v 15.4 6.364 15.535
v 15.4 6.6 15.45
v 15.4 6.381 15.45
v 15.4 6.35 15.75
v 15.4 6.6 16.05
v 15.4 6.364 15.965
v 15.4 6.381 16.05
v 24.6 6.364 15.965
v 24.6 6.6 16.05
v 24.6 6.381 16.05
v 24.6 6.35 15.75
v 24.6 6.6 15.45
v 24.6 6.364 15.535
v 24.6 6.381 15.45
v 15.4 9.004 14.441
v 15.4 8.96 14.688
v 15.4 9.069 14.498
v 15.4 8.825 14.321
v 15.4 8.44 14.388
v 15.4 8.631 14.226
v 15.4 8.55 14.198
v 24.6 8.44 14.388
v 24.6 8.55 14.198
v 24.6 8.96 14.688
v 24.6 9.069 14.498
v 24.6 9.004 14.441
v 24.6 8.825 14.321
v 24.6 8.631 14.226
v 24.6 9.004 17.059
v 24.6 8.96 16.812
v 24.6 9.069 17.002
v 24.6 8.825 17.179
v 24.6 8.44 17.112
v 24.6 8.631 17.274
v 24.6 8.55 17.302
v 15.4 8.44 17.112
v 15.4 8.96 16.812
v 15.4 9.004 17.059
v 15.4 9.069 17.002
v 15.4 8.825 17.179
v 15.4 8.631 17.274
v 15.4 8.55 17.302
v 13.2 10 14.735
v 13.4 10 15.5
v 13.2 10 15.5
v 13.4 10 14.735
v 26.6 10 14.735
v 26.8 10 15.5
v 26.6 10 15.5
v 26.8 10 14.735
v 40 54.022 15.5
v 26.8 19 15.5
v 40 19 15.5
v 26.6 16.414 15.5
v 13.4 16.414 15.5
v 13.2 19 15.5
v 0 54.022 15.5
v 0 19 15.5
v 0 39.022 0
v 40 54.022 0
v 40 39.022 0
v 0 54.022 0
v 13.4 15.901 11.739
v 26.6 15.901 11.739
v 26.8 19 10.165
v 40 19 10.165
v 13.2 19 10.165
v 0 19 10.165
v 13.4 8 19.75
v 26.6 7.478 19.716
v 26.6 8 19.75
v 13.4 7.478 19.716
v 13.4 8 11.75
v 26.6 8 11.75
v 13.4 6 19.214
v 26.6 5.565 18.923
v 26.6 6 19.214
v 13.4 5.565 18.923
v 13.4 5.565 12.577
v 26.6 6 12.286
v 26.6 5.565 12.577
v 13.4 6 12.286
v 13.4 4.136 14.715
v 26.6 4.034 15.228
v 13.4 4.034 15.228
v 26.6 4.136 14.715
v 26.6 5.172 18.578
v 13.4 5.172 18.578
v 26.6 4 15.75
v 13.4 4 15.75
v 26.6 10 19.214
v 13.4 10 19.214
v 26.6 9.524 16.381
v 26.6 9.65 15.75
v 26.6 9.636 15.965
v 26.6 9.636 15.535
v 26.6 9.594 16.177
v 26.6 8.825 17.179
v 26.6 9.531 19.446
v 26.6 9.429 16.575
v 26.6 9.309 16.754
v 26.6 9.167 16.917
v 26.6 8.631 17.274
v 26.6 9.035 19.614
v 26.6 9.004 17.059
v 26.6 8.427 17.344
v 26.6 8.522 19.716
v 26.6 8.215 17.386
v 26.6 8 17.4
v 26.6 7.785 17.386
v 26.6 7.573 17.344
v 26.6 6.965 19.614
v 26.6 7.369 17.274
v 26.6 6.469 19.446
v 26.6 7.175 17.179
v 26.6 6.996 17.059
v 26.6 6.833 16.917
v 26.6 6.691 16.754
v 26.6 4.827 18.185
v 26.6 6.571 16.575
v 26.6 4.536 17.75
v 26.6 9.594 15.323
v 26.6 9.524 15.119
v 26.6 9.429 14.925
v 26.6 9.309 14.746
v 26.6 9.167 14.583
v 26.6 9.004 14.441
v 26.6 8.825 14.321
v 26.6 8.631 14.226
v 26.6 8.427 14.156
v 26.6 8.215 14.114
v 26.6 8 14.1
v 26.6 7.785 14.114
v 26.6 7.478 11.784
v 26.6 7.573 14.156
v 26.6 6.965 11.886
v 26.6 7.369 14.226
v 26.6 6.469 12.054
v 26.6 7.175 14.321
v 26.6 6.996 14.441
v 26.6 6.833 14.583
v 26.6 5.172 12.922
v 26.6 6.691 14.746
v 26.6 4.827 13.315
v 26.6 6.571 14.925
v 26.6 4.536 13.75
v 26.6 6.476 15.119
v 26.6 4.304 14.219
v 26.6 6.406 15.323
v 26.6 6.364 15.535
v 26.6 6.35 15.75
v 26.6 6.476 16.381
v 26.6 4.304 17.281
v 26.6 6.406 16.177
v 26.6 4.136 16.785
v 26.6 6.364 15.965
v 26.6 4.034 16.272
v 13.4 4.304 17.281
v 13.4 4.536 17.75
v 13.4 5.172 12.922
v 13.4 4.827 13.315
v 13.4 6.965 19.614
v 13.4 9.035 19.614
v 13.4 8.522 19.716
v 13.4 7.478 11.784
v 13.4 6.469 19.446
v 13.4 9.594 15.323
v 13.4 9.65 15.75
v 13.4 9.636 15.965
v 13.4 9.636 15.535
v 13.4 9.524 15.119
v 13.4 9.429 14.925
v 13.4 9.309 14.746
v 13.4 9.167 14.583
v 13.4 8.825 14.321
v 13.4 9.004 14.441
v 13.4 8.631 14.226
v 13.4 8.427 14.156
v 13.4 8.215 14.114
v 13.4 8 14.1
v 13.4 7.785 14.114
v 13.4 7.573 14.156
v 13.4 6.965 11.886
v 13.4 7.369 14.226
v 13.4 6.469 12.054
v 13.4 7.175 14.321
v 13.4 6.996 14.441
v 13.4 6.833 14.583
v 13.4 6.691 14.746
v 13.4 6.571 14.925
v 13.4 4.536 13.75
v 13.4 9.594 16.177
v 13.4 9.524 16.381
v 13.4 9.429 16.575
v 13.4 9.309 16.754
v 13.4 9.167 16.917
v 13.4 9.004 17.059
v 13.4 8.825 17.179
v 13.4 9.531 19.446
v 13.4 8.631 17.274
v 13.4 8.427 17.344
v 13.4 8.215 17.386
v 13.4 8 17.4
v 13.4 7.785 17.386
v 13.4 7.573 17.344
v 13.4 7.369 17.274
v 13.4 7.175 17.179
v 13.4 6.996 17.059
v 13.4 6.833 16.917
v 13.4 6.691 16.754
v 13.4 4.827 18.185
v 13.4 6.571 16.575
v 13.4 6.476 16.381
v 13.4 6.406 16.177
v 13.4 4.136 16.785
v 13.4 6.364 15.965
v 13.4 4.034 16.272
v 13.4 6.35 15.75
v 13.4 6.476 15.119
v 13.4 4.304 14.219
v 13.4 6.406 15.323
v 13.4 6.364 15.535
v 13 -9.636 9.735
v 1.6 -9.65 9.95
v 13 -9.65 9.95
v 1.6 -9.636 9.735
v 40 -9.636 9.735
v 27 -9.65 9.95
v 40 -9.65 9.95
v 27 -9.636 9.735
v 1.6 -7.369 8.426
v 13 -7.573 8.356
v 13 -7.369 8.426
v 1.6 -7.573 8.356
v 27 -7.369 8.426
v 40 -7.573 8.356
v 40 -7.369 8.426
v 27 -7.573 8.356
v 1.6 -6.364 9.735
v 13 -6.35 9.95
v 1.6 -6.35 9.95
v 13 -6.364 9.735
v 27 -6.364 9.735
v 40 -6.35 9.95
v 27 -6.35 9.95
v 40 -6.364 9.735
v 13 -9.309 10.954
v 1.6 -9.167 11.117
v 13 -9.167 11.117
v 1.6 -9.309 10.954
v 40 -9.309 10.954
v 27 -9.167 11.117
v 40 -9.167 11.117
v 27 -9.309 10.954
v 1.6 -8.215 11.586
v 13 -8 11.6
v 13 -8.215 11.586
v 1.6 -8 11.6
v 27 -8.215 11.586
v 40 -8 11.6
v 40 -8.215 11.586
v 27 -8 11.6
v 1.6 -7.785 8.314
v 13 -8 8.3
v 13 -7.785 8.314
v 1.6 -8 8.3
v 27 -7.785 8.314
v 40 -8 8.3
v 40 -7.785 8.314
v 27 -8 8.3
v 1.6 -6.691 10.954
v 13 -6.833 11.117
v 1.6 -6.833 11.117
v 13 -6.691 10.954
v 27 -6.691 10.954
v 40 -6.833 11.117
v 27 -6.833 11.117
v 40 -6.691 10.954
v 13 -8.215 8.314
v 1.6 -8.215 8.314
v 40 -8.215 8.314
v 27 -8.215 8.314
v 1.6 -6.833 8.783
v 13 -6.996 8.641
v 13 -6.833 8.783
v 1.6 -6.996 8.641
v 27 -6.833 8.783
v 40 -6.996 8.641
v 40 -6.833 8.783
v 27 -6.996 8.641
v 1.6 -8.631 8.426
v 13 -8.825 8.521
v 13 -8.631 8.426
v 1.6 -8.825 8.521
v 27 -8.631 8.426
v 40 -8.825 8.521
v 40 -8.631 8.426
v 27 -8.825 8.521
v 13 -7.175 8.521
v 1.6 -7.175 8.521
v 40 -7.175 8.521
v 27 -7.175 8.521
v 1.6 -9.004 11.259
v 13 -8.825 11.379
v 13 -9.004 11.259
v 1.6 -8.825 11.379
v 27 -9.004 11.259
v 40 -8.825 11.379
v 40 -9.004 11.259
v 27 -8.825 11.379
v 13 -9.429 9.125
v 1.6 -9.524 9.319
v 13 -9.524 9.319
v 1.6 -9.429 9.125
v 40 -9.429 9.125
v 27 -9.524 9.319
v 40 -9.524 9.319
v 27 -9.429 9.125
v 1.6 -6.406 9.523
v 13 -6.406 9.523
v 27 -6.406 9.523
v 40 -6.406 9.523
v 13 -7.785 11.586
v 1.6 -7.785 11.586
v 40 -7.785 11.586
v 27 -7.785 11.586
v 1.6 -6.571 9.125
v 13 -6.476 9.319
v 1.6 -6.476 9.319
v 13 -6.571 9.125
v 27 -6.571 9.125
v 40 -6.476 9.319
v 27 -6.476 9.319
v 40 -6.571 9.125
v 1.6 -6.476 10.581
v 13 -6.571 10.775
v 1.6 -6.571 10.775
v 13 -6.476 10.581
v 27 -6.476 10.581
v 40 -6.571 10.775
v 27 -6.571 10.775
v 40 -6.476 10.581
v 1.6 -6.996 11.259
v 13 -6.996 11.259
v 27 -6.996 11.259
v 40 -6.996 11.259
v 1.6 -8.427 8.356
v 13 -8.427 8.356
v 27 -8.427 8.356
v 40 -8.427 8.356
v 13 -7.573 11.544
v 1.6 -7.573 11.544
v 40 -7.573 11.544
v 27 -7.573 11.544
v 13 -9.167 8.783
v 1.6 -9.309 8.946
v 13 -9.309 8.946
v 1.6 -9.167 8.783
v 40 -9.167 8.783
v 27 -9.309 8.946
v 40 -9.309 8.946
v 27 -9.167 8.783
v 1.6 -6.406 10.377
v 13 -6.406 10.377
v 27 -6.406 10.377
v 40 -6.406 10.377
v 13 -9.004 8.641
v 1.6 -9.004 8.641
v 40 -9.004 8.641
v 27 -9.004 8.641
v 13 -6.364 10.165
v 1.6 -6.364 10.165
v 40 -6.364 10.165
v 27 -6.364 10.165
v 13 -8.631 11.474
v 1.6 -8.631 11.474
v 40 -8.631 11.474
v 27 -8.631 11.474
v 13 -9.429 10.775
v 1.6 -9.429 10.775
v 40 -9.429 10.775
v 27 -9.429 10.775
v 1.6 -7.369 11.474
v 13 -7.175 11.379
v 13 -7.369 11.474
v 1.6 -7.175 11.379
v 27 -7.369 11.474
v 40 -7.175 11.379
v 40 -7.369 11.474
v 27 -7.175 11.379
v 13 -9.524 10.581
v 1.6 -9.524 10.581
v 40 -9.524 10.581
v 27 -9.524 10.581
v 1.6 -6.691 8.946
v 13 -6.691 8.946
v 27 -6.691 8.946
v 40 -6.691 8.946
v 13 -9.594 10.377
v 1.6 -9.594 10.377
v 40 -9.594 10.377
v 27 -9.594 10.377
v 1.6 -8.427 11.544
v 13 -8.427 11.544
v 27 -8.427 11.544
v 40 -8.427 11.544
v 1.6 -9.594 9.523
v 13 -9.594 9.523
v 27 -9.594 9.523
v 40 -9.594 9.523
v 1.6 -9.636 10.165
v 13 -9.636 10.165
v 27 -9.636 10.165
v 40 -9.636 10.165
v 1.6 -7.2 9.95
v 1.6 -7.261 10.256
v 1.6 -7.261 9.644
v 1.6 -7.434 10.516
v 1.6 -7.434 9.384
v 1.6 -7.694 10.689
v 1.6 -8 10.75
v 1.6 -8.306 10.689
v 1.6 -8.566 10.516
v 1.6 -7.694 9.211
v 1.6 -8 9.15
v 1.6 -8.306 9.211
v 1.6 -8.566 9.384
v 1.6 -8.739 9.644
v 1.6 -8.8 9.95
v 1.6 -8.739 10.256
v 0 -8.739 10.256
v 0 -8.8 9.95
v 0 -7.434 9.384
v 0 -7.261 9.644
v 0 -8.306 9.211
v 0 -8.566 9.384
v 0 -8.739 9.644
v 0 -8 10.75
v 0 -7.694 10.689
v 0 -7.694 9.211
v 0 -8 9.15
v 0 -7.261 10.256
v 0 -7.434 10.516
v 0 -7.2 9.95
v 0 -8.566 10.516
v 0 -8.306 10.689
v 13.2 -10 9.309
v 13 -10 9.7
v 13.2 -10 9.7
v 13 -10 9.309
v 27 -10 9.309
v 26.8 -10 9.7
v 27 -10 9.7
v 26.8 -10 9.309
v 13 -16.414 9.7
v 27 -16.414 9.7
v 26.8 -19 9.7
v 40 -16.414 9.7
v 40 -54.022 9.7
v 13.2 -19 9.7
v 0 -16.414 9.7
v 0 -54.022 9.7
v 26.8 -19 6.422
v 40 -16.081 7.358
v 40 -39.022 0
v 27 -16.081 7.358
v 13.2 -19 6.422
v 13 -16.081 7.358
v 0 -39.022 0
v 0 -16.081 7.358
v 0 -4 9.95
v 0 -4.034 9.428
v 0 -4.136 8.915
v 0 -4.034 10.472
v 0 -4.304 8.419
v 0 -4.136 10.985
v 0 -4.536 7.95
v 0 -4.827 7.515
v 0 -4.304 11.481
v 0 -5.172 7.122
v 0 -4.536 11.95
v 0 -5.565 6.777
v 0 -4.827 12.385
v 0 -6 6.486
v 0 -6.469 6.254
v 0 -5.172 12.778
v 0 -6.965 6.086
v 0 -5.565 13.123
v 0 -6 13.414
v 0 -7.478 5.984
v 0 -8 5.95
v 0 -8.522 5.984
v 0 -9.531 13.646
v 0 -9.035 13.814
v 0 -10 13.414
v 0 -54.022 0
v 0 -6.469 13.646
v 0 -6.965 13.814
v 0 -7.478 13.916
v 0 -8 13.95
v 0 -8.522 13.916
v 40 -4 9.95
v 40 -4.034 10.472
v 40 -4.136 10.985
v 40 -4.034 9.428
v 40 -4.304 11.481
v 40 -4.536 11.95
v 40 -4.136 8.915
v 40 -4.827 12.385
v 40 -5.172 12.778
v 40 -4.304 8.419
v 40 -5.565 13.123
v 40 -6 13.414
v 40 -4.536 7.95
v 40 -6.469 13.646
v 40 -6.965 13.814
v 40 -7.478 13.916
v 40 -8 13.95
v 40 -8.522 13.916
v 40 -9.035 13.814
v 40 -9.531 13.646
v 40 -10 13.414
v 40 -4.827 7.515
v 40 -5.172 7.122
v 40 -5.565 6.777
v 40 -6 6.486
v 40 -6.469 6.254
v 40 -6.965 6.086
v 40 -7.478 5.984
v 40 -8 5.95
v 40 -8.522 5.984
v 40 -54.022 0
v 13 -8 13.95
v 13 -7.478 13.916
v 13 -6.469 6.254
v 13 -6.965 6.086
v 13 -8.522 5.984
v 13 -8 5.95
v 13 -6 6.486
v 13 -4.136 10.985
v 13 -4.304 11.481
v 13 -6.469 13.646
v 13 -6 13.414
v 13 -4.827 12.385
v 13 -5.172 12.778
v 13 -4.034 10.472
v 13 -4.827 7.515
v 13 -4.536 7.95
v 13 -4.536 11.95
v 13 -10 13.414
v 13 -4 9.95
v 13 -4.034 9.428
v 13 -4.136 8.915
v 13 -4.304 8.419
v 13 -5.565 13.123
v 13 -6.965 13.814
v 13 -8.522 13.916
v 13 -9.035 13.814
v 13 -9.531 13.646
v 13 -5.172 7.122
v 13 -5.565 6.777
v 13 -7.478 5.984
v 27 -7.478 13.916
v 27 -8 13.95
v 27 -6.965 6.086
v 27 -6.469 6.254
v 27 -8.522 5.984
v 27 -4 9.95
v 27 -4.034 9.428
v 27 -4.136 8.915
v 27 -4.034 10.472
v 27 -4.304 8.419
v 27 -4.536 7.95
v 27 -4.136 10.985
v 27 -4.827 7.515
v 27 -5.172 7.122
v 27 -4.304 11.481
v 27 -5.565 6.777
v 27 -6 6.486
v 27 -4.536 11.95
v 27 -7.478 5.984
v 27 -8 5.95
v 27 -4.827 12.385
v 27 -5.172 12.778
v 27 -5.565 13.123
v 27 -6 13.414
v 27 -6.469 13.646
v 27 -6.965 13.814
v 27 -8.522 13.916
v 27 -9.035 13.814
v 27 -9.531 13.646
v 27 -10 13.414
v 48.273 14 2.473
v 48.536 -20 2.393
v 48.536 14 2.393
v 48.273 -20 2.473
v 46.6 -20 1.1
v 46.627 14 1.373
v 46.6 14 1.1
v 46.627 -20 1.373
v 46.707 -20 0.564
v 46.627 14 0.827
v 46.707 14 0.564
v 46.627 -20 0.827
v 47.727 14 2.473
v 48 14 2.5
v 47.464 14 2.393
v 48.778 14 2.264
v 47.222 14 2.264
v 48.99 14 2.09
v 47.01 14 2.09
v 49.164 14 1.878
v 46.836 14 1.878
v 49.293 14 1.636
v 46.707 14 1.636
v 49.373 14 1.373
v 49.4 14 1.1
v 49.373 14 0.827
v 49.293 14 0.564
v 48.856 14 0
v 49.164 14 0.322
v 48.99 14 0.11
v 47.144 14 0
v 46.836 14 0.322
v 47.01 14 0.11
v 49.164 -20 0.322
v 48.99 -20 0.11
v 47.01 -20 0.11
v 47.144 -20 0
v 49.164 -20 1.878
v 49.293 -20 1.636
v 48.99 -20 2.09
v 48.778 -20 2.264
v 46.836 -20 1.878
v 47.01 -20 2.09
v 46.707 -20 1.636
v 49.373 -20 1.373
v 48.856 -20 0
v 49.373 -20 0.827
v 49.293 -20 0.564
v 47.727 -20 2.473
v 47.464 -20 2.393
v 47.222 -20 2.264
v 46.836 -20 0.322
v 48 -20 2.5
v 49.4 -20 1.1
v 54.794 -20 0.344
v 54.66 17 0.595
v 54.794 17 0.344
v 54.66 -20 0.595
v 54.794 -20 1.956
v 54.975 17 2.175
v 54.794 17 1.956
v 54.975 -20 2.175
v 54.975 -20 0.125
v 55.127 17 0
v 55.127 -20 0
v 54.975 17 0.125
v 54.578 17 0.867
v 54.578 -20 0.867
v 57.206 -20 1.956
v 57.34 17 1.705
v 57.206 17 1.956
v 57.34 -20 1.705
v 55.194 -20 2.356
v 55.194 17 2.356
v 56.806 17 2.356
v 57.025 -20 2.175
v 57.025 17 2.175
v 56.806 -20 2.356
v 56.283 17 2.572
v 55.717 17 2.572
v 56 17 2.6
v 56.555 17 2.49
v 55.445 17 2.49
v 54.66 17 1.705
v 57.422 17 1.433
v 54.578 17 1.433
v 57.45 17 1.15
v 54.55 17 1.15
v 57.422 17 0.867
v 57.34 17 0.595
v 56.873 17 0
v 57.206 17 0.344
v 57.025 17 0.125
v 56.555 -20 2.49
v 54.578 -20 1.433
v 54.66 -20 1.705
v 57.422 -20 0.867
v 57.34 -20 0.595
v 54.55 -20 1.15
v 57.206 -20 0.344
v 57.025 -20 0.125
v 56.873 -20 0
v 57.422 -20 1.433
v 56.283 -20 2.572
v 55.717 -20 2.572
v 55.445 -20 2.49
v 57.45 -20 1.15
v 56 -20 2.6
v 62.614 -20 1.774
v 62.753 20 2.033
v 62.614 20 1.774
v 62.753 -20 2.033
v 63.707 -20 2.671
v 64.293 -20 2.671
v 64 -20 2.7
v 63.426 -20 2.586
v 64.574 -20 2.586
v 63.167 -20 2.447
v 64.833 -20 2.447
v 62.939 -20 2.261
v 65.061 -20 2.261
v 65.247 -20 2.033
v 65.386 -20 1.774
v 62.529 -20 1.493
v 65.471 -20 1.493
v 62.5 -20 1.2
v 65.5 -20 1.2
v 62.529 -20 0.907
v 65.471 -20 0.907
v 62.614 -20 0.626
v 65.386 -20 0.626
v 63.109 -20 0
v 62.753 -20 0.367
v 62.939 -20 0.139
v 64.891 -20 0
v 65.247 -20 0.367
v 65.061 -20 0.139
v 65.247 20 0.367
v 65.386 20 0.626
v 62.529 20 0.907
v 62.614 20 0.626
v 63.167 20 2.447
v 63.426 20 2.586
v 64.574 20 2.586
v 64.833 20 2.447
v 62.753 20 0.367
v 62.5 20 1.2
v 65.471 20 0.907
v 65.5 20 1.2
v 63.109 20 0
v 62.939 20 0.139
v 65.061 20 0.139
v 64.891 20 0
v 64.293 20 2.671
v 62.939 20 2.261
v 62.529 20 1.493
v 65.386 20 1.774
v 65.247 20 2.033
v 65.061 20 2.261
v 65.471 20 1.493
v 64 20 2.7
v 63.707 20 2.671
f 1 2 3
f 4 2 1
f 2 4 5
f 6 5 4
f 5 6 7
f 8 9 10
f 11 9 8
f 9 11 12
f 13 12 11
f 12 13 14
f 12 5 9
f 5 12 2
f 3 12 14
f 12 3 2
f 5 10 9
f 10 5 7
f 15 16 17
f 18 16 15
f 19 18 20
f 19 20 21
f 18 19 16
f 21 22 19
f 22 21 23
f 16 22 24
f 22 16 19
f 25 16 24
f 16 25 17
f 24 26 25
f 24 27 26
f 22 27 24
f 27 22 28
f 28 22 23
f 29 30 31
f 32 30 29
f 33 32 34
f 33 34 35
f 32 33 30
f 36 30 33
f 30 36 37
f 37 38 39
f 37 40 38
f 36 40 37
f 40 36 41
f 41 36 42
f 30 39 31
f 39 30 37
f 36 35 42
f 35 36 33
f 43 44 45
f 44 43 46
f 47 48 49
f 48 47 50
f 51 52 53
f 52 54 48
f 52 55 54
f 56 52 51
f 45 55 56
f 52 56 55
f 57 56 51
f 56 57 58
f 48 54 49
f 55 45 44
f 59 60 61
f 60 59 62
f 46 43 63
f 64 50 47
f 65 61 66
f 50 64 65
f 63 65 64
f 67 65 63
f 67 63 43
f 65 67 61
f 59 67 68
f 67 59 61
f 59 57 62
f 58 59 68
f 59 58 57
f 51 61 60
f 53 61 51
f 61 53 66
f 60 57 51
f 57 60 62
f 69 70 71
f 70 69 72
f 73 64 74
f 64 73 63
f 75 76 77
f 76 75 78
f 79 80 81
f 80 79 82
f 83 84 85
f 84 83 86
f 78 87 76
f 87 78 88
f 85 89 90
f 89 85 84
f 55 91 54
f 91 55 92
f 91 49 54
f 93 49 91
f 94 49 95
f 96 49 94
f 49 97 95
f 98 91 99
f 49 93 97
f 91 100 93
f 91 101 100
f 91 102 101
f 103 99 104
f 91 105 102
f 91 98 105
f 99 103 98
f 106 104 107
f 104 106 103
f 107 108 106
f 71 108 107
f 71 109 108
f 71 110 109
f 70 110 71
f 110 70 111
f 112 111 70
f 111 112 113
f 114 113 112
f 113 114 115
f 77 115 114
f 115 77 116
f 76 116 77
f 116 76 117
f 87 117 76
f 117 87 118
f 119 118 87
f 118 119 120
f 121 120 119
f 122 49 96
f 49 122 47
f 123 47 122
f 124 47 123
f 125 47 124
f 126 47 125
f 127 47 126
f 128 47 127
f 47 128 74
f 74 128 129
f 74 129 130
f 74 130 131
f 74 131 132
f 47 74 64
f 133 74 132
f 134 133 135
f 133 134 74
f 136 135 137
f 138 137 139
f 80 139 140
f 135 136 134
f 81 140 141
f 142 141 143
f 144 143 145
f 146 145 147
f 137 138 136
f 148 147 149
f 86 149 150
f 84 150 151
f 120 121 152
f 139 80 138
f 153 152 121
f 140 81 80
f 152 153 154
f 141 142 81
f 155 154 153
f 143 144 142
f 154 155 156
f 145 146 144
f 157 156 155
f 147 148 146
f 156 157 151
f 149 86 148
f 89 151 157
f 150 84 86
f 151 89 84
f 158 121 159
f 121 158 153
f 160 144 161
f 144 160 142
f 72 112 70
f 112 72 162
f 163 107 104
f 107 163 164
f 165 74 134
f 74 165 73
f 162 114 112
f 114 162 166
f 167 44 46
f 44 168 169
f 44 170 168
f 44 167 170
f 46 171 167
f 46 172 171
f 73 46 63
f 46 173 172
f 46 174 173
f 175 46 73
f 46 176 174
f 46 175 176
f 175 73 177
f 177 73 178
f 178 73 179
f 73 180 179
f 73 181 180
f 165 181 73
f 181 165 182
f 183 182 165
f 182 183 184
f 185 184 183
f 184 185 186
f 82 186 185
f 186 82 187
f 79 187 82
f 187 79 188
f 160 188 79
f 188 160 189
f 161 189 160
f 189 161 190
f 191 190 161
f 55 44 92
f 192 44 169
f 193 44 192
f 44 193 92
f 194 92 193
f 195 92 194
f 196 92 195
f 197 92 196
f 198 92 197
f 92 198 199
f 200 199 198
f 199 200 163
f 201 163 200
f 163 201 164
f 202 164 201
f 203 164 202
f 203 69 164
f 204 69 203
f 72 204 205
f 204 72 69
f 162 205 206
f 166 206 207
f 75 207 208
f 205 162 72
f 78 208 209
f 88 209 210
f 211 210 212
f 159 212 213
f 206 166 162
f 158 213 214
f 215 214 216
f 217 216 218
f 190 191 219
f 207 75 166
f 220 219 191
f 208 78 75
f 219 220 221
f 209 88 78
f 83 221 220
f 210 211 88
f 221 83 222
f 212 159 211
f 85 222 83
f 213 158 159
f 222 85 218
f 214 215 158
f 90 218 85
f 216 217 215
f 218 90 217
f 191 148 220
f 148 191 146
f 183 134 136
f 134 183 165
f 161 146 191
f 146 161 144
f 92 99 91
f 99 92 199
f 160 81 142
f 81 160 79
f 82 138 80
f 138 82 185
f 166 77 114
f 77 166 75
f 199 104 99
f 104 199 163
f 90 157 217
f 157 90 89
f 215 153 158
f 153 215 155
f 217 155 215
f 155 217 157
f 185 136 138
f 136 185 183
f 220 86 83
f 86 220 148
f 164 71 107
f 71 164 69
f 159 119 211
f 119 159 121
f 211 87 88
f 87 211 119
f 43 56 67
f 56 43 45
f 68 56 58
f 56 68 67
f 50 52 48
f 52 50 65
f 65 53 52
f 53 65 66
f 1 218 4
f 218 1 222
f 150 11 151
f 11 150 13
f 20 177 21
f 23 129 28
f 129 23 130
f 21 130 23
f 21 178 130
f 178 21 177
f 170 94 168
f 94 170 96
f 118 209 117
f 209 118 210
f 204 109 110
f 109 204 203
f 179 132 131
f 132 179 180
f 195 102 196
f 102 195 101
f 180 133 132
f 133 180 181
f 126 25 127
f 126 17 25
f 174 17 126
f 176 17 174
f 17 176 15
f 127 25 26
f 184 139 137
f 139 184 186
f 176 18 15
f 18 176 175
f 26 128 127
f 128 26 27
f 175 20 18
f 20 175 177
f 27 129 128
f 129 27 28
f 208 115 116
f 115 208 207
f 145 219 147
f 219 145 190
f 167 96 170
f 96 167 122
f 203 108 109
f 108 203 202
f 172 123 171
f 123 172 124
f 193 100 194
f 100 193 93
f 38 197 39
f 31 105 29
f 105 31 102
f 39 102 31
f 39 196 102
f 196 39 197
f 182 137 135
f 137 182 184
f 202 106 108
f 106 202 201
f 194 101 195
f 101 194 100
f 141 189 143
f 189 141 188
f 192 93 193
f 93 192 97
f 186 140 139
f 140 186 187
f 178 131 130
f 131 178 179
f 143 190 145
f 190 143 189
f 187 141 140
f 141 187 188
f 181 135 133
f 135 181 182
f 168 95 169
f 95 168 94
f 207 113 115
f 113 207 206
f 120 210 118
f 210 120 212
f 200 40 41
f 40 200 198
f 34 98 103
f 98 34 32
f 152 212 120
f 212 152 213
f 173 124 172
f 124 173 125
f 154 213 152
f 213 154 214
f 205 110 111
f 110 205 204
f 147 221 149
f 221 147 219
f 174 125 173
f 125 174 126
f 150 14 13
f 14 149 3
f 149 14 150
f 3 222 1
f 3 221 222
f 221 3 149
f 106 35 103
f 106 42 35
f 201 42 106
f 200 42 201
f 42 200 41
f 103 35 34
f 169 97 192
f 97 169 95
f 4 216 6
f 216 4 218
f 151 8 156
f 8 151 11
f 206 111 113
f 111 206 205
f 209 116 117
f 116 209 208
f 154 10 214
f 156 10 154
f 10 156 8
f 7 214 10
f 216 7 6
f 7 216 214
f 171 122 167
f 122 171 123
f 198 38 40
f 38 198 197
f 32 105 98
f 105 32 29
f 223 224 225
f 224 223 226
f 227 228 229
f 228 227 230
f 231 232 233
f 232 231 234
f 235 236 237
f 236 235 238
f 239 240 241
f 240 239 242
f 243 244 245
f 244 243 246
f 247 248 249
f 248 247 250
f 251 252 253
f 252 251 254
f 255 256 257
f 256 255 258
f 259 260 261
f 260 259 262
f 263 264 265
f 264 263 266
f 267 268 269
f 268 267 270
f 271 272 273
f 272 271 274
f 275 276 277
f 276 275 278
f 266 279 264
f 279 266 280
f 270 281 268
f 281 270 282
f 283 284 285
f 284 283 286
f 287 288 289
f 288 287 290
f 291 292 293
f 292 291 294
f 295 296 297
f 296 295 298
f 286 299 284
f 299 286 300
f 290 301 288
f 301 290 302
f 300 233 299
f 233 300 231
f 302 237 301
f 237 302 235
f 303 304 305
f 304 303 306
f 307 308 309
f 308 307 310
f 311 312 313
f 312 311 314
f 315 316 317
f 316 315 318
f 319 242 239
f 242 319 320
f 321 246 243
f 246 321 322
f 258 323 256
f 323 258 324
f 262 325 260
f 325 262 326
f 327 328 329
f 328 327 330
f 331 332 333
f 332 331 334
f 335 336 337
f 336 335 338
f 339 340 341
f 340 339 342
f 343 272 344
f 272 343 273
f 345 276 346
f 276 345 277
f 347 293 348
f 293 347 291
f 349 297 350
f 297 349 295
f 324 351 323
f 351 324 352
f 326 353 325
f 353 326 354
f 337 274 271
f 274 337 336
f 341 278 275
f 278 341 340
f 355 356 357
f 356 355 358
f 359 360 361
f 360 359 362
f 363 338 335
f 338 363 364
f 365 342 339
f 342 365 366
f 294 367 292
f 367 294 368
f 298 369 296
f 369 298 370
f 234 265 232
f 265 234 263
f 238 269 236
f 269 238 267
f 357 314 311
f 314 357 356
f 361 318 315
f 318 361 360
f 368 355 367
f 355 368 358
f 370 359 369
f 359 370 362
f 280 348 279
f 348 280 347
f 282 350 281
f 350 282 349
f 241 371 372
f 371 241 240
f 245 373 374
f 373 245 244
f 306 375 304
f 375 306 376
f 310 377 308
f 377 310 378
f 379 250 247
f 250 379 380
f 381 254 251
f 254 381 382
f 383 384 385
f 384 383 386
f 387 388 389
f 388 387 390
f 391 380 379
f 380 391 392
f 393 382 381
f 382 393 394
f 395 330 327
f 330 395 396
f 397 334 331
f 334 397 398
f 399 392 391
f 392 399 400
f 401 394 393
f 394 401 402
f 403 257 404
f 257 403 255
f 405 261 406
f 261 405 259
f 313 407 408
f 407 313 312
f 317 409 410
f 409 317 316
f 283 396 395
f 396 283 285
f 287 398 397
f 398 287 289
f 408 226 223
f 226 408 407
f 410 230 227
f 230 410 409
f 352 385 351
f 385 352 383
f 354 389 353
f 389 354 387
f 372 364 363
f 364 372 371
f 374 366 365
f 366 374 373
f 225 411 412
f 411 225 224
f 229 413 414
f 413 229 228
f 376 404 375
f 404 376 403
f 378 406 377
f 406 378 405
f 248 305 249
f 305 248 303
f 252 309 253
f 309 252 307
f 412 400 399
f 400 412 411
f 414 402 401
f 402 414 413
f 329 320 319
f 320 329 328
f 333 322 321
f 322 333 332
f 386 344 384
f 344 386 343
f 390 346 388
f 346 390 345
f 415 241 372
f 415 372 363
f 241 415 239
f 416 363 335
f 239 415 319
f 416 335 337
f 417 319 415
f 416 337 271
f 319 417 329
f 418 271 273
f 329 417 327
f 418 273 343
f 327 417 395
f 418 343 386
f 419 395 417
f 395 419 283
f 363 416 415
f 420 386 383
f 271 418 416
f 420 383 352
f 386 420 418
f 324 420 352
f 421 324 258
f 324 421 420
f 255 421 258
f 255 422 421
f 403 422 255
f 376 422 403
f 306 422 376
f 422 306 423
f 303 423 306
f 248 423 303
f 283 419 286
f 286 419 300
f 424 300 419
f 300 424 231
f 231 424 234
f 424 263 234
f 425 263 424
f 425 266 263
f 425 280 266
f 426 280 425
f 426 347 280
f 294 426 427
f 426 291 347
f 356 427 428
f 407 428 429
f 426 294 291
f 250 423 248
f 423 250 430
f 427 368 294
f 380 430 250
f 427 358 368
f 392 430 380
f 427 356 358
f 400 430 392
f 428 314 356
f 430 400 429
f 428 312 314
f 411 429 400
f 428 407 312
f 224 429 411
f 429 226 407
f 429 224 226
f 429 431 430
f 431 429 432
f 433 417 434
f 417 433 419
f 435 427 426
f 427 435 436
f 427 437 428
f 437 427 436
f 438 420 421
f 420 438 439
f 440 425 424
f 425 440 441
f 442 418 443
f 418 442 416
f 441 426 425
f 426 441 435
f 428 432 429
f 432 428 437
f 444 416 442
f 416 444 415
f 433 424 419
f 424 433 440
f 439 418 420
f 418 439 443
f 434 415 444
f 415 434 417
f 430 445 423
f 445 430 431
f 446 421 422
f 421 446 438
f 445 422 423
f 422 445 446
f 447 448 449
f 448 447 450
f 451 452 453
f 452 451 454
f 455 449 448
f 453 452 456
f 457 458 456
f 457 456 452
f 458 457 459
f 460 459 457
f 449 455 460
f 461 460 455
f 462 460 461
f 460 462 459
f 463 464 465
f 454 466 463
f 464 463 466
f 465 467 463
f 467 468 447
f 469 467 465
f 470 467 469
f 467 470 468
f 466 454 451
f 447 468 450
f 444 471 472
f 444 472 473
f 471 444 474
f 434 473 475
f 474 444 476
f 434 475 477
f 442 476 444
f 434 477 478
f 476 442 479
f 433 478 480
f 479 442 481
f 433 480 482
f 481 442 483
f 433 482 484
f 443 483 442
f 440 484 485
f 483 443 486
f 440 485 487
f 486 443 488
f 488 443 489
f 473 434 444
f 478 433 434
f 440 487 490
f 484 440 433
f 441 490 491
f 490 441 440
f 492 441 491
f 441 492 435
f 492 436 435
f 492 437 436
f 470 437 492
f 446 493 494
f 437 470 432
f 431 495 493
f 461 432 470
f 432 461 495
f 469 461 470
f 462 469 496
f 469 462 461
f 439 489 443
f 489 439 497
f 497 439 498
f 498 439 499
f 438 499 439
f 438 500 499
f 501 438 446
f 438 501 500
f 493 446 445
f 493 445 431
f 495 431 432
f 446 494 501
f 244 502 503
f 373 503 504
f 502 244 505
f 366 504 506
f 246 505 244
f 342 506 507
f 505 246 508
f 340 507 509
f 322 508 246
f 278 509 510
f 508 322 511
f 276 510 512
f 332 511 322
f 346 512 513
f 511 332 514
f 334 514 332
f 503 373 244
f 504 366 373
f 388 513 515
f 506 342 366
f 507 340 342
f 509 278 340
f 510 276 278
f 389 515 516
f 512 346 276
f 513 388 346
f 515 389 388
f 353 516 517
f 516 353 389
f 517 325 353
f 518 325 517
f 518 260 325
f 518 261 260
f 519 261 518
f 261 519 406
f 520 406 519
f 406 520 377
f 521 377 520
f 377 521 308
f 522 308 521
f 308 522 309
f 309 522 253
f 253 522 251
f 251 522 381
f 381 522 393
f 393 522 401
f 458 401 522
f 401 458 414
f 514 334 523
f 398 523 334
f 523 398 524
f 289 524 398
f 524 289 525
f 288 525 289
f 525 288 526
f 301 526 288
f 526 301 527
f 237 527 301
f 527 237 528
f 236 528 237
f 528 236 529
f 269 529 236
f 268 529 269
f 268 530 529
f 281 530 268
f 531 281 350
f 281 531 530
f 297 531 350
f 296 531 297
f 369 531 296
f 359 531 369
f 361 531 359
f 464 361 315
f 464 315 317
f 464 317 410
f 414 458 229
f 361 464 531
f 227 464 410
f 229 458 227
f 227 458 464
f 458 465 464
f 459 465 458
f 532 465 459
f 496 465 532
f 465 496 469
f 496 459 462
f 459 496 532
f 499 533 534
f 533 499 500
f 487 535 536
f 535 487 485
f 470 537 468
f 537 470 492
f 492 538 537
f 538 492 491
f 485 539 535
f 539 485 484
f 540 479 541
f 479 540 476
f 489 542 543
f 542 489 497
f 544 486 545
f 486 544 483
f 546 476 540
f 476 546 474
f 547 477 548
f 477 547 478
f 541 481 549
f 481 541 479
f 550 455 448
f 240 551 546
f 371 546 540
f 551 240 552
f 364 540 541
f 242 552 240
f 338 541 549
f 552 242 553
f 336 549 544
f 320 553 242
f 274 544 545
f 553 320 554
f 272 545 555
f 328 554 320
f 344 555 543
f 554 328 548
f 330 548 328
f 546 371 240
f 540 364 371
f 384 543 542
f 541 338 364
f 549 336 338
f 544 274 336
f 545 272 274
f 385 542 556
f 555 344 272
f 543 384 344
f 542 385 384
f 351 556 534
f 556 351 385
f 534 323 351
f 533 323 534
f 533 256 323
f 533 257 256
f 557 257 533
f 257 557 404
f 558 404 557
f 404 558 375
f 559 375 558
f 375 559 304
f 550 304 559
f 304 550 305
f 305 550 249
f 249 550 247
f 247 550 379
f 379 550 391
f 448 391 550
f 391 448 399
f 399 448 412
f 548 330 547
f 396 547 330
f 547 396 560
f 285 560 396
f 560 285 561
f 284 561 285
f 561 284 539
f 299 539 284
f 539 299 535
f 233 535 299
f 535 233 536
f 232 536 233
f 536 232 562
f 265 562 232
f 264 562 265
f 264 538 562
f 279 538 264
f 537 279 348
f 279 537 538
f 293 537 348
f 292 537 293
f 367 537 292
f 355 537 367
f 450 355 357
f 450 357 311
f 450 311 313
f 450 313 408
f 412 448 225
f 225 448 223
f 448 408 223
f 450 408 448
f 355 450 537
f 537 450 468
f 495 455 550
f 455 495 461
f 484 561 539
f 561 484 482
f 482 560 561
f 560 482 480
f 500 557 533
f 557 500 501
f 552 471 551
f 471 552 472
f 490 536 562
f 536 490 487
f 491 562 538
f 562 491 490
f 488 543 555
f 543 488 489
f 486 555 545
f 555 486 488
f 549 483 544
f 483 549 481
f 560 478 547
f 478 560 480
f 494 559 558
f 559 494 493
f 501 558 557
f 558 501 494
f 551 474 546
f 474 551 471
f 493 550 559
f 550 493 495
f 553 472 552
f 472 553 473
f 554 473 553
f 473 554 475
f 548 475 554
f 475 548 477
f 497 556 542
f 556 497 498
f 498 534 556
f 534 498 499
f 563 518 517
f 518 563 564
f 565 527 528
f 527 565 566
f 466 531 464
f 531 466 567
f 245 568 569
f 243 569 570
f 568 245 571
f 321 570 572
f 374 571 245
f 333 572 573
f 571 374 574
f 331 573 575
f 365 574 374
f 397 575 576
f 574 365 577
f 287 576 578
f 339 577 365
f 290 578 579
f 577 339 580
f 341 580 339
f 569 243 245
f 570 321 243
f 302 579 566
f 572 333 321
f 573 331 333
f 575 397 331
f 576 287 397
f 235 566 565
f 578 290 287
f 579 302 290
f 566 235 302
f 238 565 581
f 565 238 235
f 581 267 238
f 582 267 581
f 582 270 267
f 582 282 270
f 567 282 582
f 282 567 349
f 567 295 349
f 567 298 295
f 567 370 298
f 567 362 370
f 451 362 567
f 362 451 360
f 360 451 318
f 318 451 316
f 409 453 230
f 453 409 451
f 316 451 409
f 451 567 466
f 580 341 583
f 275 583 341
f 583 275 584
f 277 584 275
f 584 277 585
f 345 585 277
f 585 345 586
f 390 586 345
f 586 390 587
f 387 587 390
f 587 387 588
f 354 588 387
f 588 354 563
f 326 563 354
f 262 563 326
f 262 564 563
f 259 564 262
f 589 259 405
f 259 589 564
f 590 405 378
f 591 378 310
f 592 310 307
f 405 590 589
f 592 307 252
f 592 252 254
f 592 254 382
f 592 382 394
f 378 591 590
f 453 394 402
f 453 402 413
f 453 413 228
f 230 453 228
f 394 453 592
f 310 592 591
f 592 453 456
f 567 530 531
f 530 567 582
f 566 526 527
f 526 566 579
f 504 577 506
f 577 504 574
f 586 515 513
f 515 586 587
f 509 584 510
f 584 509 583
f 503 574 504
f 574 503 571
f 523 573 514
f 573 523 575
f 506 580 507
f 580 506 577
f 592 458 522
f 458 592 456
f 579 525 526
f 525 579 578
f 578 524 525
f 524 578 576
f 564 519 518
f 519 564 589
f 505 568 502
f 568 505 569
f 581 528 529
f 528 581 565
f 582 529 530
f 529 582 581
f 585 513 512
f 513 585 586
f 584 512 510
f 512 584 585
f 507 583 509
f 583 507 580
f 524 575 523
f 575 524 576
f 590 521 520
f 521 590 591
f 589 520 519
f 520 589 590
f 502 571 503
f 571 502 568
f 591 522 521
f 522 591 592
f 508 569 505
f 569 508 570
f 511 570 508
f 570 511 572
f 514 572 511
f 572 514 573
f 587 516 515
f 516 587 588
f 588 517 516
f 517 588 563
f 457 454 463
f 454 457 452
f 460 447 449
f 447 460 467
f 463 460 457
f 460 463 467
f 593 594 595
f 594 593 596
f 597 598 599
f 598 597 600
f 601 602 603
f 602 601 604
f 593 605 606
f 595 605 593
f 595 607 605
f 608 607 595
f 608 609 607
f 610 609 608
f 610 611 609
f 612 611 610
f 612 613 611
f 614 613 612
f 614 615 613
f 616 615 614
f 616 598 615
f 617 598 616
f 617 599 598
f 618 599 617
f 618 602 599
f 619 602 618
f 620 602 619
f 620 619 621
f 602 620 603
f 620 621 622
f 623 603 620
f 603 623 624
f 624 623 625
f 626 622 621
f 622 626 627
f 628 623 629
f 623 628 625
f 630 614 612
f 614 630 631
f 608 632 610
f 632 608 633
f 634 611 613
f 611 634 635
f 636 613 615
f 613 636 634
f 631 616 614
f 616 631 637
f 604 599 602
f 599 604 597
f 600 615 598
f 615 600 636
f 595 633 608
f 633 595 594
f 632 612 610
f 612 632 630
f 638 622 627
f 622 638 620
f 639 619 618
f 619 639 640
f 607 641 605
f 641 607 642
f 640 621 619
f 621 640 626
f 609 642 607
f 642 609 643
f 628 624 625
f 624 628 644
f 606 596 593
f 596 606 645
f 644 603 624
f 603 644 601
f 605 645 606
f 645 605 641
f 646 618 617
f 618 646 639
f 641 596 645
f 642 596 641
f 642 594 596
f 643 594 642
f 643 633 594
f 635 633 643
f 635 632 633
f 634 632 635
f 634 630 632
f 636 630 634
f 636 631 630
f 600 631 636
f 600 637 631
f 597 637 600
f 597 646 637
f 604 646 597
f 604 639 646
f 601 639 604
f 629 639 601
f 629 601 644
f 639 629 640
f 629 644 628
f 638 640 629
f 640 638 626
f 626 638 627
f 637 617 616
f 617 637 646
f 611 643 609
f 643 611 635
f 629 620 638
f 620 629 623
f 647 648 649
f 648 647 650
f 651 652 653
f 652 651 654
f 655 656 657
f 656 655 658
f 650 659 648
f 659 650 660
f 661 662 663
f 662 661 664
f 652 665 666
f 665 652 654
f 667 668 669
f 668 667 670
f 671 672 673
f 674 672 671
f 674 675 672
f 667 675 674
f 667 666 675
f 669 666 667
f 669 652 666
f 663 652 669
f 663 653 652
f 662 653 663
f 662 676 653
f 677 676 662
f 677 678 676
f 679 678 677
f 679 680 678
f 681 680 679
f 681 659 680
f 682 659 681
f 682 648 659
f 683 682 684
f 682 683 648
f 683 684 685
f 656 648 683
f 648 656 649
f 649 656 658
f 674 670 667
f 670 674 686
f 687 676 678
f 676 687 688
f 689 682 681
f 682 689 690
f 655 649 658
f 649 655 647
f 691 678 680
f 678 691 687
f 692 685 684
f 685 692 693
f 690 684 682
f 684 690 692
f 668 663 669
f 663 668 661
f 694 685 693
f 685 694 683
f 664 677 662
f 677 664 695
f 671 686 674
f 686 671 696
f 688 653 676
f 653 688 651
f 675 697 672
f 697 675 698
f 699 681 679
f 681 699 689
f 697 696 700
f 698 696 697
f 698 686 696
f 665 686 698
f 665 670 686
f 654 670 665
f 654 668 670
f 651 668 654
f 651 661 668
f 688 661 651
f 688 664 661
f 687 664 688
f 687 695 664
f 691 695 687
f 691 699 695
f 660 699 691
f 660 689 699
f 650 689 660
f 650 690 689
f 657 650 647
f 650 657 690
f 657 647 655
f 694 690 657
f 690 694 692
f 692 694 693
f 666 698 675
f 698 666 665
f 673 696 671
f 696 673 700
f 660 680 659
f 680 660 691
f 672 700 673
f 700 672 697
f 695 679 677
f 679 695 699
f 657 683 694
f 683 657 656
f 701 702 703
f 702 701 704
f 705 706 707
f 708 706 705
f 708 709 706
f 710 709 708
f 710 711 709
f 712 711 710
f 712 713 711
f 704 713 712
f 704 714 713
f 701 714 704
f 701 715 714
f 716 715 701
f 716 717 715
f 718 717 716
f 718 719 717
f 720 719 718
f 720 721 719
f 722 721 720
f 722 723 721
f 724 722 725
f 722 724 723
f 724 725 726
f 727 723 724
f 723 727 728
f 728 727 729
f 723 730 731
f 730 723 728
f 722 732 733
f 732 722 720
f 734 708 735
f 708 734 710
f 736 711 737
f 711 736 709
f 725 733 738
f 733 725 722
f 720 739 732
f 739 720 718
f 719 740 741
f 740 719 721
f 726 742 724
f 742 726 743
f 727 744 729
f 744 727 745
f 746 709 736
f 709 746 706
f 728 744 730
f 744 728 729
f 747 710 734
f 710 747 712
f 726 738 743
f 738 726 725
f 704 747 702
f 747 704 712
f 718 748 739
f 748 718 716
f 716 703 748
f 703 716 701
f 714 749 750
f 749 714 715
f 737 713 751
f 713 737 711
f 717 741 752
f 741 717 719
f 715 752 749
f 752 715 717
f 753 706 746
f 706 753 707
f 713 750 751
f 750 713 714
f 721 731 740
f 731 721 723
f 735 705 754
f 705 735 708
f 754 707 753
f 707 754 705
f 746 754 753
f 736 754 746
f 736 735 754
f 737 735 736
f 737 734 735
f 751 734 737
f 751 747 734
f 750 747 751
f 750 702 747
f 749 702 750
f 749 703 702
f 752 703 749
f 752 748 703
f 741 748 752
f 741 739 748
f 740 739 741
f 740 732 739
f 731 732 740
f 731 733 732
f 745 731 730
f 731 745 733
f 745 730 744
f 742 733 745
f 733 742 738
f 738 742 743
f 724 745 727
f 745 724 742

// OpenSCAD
// Hinge test piece for cyberdeck1 rev 0.1.
//
// A slice of the real hinge, 40 mm wide: the two tapers, the three knuckles, the pin
// hole with its closed end and push-out hole, and the crush ribs. The shapes come from
// ../case/case.scad, so a change there changes this piece.
//
// Make the plate:  openscad-nightly -o hinge_test_plate.stl hinge_test.scad

include <../case/case.scad>
view  = "none";      // draw nothing from case.scad itself
hinge = "bevel";

tpart = "plate";     // plate | k_leaf | t_leaf | pins | assembly
ttheta = 180;        // assembly: 360 = closed, SCREEN = stand, 180 = flat

WT   = 40;           // width of the slice
BODY = 15;           // length of full-thickness body behind each taper
// Knuckle bands, as in the case: T, K, T.
TB = [[0, 13], [27, 13]];
KB = [[13.4, 13.2]];
PINS = [[2.8, 34], [2.9, 37], [3.0, 40]];   // [diameter, length]: the longest is the thickest

module t_holes() {
    translate([PIN_X0, 0, HG]) rotate([0, 90, 0]) cylinder(d = PIN_D, h = WT);
    translate([-1, 0, HG]) rotate([0, 90, 0]) cylinder(d = 1.6, h = PIN_X0 + 2, $fn = 16);
}

module k_leaf() {
    for (b = KB) crush_ribs_at(b);
    difference() {
        union() {
            intersection() {
                union() { nose(T_K); translate([0, E, -T_K]) cube([WT, BODY, T_K]); }
                translate([0, -50, -50]) cube([WT, 200, 100]);
            }
            for (b = KB) bevel_knuckle(b, T_K);
        }
        for (b = TB) bevel_notch(b);
        t_holes();
    }
}

module t_leaf() {
    difference() {
        mirror([0, 1, 0]) union() {
            intersection() {
                union() { nose(T_T); translate([0, E, -T_T]) cube([WT, BODY, T_T]); }
                translate([0, -50, -50]) cube([WT, 200, 100]);
            }
            for (b = TB) bevel_knuckle(b, T_T);
        }
        mirror([0, 1, 0]) for (b = KB) bevel_notch(b);
        t_holes();
    }
}

module test_pin(d, len) {
    cut = d / 2 - 0.3;
    translate([0, 0, cut]) difference() {
        rotate([0, 90, 0]) cylinder(d = d, h = len, $fn = 32);
        translate([-1, -d, -d - cut]) cube([len + 2, 2 * d, d]);
    }
}

module pins() { for (i = [0 : len(PINS) - 1]) translate([0, 8 * i, 0]) test_pin(PINS[i][0], PINS[i][1]); }

if (tpart == "plate") {
    translate([0, 8, T_K]) k_leaf();
    translate([0, -8, T_T]) t_leaf();
    // The pins lie beside the leaves, along Y. Each is clear of the leaves and of the others.
    for (i = [0 : len(PINS) - 1])
        translate([WT + 8 + 8 * i, -20, 0]) rotate([0, 0, 90]) test_pin(PINS[i][0], PINS[i][1]);
}
else if (tpart == "k_leaf") translate([0, 0, T_K]) k_leaf();
else if (tpart == "t_leaf") translate([0, 0, T_T]) t_leaf();
else if (tpart == "pins") pins();
else if (tpart == "assembly") { k_leaf(); posed(ttheta) t_leaf(); }
else if (tpart == "x") intersection() { k_leaf(); posed(ttheta) t_leaf(); }
// Plate check: this must be empty. The pins must not touch the leaves.
if (tpart == "x_plate") intersection() {
    union() { translate([0, 8, T_K]) k_leaf(); translate([0, -8, T_T]) t_leaf(); }
    for (i = [0 : len(PINS) - 1])
        translate([WT + 8 + 8 * i, -20, 0]) rotate([0, 0, 90]) test_pin(PINS[i][0] + 2, PINS[i][1]);
}
